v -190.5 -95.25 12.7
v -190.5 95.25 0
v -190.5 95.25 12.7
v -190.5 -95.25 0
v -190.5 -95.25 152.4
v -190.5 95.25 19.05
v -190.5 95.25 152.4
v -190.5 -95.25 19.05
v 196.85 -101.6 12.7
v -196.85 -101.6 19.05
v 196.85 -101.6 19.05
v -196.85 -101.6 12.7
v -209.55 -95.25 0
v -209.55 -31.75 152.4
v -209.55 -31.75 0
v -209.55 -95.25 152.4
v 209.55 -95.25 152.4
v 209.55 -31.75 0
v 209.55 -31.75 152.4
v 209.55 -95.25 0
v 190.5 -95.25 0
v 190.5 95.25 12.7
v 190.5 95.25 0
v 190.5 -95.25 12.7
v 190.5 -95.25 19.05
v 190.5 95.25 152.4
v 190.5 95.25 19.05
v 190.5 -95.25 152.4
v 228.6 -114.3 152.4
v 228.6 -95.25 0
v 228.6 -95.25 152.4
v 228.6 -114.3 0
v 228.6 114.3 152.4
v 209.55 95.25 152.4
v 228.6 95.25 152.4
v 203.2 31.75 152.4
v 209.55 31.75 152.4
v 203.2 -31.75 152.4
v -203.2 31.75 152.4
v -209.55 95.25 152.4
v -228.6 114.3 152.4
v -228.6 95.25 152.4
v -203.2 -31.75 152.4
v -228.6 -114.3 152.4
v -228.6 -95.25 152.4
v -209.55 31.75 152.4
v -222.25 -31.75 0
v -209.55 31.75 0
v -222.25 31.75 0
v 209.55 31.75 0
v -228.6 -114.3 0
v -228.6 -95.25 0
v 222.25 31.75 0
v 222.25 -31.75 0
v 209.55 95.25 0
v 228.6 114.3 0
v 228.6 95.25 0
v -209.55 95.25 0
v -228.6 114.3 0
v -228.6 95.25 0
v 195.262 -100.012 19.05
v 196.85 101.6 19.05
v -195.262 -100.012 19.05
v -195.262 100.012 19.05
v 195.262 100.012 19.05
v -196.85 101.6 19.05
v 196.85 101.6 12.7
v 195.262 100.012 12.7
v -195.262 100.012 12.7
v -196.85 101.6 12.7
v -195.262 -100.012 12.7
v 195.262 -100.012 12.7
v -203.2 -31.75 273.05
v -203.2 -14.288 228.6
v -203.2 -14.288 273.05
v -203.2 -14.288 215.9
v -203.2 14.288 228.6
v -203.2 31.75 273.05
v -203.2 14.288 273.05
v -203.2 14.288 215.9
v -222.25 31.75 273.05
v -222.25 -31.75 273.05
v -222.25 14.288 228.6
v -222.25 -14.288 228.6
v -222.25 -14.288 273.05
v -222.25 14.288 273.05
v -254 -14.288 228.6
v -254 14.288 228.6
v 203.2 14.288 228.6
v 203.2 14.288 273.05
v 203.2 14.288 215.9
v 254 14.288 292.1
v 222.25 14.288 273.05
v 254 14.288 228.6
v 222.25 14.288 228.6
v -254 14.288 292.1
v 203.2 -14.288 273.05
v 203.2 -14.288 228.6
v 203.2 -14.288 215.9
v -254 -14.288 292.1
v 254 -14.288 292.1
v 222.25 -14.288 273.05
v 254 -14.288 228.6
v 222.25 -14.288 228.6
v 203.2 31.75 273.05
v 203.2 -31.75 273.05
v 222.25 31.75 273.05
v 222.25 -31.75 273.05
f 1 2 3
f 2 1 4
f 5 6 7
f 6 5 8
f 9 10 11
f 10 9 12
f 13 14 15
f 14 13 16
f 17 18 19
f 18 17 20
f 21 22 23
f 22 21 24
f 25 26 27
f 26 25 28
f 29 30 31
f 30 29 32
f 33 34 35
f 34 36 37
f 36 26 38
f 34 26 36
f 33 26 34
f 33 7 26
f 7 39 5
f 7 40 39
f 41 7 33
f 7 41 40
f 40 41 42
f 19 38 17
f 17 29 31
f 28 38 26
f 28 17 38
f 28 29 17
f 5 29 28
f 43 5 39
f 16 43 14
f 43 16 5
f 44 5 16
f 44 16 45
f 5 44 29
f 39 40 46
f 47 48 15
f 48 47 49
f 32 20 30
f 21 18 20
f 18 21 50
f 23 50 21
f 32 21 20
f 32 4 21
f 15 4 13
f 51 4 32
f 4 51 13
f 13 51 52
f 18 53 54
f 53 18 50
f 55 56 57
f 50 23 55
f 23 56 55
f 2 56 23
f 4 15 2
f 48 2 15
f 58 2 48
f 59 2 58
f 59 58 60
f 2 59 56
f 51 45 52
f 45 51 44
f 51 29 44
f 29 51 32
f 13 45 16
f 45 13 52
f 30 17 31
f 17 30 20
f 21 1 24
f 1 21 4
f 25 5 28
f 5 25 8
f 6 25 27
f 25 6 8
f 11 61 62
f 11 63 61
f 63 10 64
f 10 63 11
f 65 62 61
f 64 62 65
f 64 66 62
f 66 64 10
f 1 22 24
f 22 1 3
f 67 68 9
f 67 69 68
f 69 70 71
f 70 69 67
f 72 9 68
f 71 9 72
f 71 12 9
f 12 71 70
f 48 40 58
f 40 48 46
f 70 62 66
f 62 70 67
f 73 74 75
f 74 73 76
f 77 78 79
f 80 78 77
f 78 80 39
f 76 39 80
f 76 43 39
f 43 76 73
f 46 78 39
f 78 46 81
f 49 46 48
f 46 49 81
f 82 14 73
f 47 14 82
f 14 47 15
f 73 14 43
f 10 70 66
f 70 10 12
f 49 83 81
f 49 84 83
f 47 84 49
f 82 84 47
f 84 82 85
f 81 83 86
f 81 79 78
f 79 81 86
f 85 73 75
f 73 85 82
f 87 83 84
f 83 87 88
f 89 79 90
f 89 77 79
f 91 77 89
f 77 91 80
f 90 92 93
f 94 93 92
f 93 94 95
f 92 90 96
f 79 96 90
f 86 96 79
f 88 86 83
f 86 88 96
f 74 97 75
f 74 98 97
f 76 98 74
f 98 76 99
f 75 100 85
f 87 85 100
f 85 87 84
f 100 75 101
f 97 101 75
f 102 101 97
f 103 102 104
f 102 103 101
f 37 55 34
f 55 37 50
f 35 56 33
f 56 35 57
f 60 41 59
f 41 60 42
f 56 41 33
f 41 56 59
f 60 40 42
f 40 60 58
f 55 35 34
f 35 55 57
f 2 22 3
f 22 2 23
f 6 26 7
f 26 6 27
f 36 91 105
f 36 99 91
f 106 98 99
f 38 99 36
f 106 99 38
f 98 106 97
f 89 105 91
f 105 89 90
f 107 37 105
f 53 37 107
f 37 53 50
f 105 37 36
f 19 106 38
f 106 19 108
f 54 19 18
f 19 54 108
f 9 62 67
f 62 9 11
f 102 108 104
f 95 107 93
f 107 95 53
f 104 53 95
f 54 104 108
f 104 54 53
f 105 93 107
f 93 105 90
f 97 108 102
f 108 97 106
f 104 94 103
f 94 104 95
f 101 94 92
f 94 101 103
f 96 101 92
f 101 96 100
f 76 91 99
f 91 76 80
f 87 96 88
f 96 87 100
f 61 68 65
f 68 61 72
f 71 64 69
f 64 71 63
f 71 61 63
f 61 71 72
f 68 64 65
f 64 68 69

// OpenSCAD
/*
  TOOL TOTE — parametric solid-wood construction, from IMG_2348.HEIC.
  Dimensions entered in INCHES; generated geometry is in MILLIMETRES.
  X = tote length / grain of sides, handle and bottom.
  Y = tote width. Z = height above the bottom edge of the wooden sides.

  Confirmed: 10.75 is RISER LENGTH, not overall tote height. The handle
  starts as a 3 x 1.125 blank, laminated from two pieces across its width.
  Its underside notches seat 3 above the 6-high sides. The 0.5 notch depth
  and 0.25 riser housing depth are adjustable, user-confirmed defaults.
  Each underside notch continues out through the handle end. Its flat
  ceiling rests on the riser-slot floor, with no second step at the tip.
  The bottom is two edge-glued, bookmatched halves resawn from ONE parent
  board, NOT plywood. Keep stock at least 14 long through jointing/planing
  and 10 long through table-saw operations; finish shorter parts afterward.

  Interpretations left adjustable: end panels sit 0.75 in from side ends,
  enter 0.25-deep side dados, and have square tops; risers start at Z=0.
  Bottom grooves sit 0.5 above the wall bottoms. The side grooves are
  stopped within the end panels, at the roots of the end-panel grooves.
  Screw locations/sizes were not supplied. Optional cheek-cross bores are
  a configurable proposal, disabled by default; no fasteners are modeled.

  OpenSCAD 2021.01-compatible; no external libraries.
  Also see https://github.com/matthova/openrscad and
  https://openrscad.com/playground for the OpenRSCAD engine/playground.
  Open the Customizer, or edit parameters below. Use individual Part views
  for mesh export: touching components may fuse in an assembly STL.
*/

/* [View] */
Part = "assembly"; // [assembly, exploded, side, end, riser, handle, handle_laminate_1, handle_laminate_2, bottom, bottom_half_1, bottom_half_2, joint_detail]
// Separation in the exploded view, inches. Does not change the joinery.
Explode = 1.5; // [0:0.125:4]
Show_cut_list = true;

/* [Body - inches] */
Body_length = 18;
Body_width = 9;
Side_height = 6;
Side_thickness = 0.75;
End_thickness = 0.75;
// Distance from a side's end to the OUTSIDE face of its end panel.
End_setback = 0.75;
// End panels enter transverse dados cut into the side boards.
End_dado_depth = 0.25;

/* [Risers - inches] */
Riser_length = 10.75;
Riser_width = 2.5;
Riser_thickness = 0.75;
// Housing cut into the OUTSIDE face of each end panel.
Riser_dado_depth = 0.25;

/* [Laminated handle - inches] */
Handle_length = 20;
Handle_blank_height = 3;
Handle_width = 1.125;
// Two laminations across handle width; 0.5 means equal 9/16-inch layers.
Handle_lamination_fraction = 0.5; // [0.2:0.05:0.8]
// Distance from side-board TOP to the horizontal seat in each handle notch.
Notch_clearance_above_sides = 3;
// Depth of the continuous underside notch, from each riser's inside edge through the handle end. Its ceiling seats on the riser-slot floor.
Handle_notch_depth = 0.5;

/* [Bookmatched solid bottom - inches] */
Bottom_thickness = 0.25;
Bottom_groove_depth = 0.25;
// Height to the LOWER face of the bottom panel/groove.
Bottom_groove_height = 0.5;
// TOTAL allowance between the two opposing groove roots, not per edge.
Bottom_width_allowance = 0.125;
Bottom_length_allowance = 0.125;
// Total vertical play in a bottom groove, cut above the supported panel.
Bottom_groove_fit = 0;

/* [Joinery fit - inches] */
// Total extra width on dados/notches. Zero gives nominal mating surfaces.
Joint_fit = 0;

/* [Optional screw bores - unconfirmed layout] */
// Proposed transverse screw axis is Y, through a riser cheek into the handle.
Cheek_screw_bores = false;
Screw_bore_diameter = 0.15625;
// Fraction of the engaged bridle height above the notch seat.
Screw_height_fraction = 0.5; // [0.2:0.1:0.8]

/* [Hidden] */
// One color per physical piece; IDs match the viewer legend.
side_a_color = [44/255, 120/255, 181/255];
side_b_color = [57/255, 152/255, 165/255];
end_a_color = [184/255, 121/255, 36/255];
end_b_color = [182/255, 72/255, 59/255];
riser_a_color = [119/255, 98/255, 175/255];
riser_b_color = [180/255, 84/255, 139/255];
handle_a_color = [214/255, 108/255, 50/255];
handle_b_color = [86/255, 125/255, 50/255];
bottom_a_color = [122/255, 134/255, 154/255];
bottom_b_color = [188/255, 169/255, 73/255];

// Stock-preparation defaults for the console cut list and web worksheet.
// These affect stock planning only, not the finished model. Web worksheet
// controls can override them without changing the finished SCAD dimensions.
stock_milling_min_length = 14;
stock_saw_min_length = 10;
stock_resaw_kerf = 1/16;
stock_resaw_cleanup_per_half = 1/16;

inch = 25.4;
eps = 0.001;
$fn = 40;

inner_w = Body_width - 2 * Side_thickness;
end_w = inner_w + 2 * End_dado_depth;
end_outer_x = Body_length / 2 - End_setback;
end_inner_x = end_outer_x - End_thickness;
inner_l = 2 * end_inner_x;
// Canonical end/riser geometry is the +X end; mirror for the other end.
riser_inner_x = end_outer_x - Riser_dado_depth;
riser_center_x = riser_inner_x + Riser_thickness / 2;
riser_outer_x = riser_inner_x + Riser_thickness;
notch_seat_z = Side_height + Notch_clearance_above_sides;
handle_bottom_z = notch_seat_z - Handle_notch_depth;
handle_top_z = handle_bottom_z + Handle_blank_height;
bridle_engagement = Riser_length - notch_seat_z;
bottom_w = inner_w + 2 * Bottom_groove_depth - Bottom_width_allowance;
bottom_l = inner_l + 2 * Bottom_groove_depth - Bottom_length_allowance;
side_groove_half_length = end_inner_x + Bottom_groove_depth;
lamination_y = -Handle_width / 2 + Handle_width * Handle_lamination_fraction;
screw_z = notch_seat_z + bridle_engagement * Screw_height_fraction;

assert(Body_length > 0 && Body_width > 0 && Side_height > 0,
       "Body dimensions must be positive.");
assert(Side_thickness > 0 && End_thickness > 0 && inner_l > 0 && inner_w > 0,
       "Wall thicknesses/end placement leave no usable interior.");
assert(End_setback >= 0 && End_dado_depth > 0 && End_dado_depth < Side_thickness,
       "End dados must leave wood behind them.");
assert(End_setback == 0 || End_setback > Joint_fit / 2,
       "End dado fit breaks through the side end; increase End_setback.");
assert(Riser_length > Side_height && Riser_width > Handle_width + Joint_fit &&
       Riser_width + Joint_fit < inner_w && Riser_thickness > 0,
       "Risers must fit the end panels and leave two bridle cheeks.");
assert(Riser_dado_depth > 0 && Riser_dado_depth < End_thickness &&
       Riser_dado_depth < Riser_thickness,
       "Riser housing must be shallower than both mating boards.");
assert(Bottom_groove_depth > 0 && Bottom_groove_depth < Side_thickness &&
       Bottom_groove_depth + Riser_dado_depth < End_thickness,
       "Leave a web between the end's bottom groove and riser housing.");
assert(Bottom_thickness > 0 && Bottom_groove_height > 0 &&
       Bottom_groove_height + Bottom_thickness + Bottom_groove_fit < Side_height,
       "Bottom groove must fit within the side height.");
assert(Bottom_width_allowance >= 0 && Bottom_length_allowance >= 0 &&
       Bottom_width_allowance < 2 * Bottom_groove_depth &&
       Bottom_length_allowance < 2 * Bottom_groove_depth && bottom_w > 0 && bottom_l > 0,
       "Bottom panel must engage all four grooves.");
assert(Joint_fit >= 0 && Bottom_groove_fit >= 0, "Fits cannot be negative.");
assert(Handle_notch_depth > 0 && Handle_notch_depth < Handle_blank_height &&
       handle_bottom_z > Side_height && bridle_engagement > 0 &&
       handle_top_z >= Riser_length,
       "Handle must clear sides, engage riser slots and cover riser tops.");
assert(Handle_length / 2 > riser_outer_x + Joint_fit / 2,
       "Handle ends must extend beyond both risers.");
assert(Handle_lamination_fraction > 0 && Handle_lamination_fraction < 1,
       "Both handle laminations must have positive thickness.");
assert(!Cheek_screw_bores ||
       (Screw_bore_diameter > 0 && Screw_bore_diameter < Riser_thickness &&
        screw_z - Screw_bore_diameter / 2 > notch_seat_z &&
        screw_z + Screw_bore_diameter / 2 < Riser_length),
       "Screw bore must lie inside the engaged bridle, clear of edges.");

// Coordinates and cutters below are INCHES, scaled once at the output.
module box_at(p, s) { translate(p) cube(s); }
module at_end(sign) {
    if (sign == 1) children();
    else mirror([1, 0, 0]) children();
}

module side_board() {
    // Canonical side is at +Y; its inside face is y=inner_w/2.
    difference() {
        box_at([-Body_length/2, inner_w/2, 0],
               [Body_length, Side_thickness, Side_height]);
        // Full-height transverse housings for both end panels.
        for (s = [-1, 1]) at_end(s)
            box_at([end_inner_x - Joint_fit/2, inner_w/2 - eps, -eps],
                   [End_thickness + Joint_fit, End_dado_depth + eps, Side_height + 2*eps]);
        // Stopped bottom groove: extend into the end-panel joinery only.
        // Follow the end groove roots as body/end dimensions change.
        box_at([-side_groove_half_length, inner_w/2-eps, Bottom_groove_height],
               [2*side_groove_half_length, Bottom_groove_depth+eps,
                Bottom_thickness+Bottom_groove_fit]);
    }
}

module end_board() {
    difference() {
        box_at([end_inner_x, -end_w/2, 0], [End_thickness, end_w, Side_height]);
        // Vertical riser housing, outside face.
        box_at([riser_inner_x, -(Riser_width+Joint_fit)/2, -eps],
               [Riser_dado_depth+eps, Riser_width+Joint_fit, Side_height+2*eps]);
        // Horizontal bottom groove, inside face.
        box_at([end_inner_x-eps, -end_w/2-eps, Bottom_groove_height],
               [Bottom_groove_depth+eps, end_w+2*eps,
                Bottom_thickness+Bottom_groove_fit]);
    }
}

module cheek_bore() {
    translate([riser_center_x, 0, screw_z]) rotate([90, 0, 0])
        cylinder(h=Riser_width+2*eps, d=Screw_bore_diameter, center=true);
}

module riser_board() {
    difference() {
        box_at([riser_inner_x, -Riser_width/2, 0],
               [Riser_thickness, Riser_width, Riser_length]);
        // Open bridle slot down from the riser top to the notch seat.
        box_at([riser_inner_x-eps, -(Handle_width+Joint_fit)/2, notch_seat_z],
               [Riser_thickness+2*eps, Handle_width+Joint_fit, bridle_engagement+eps]);
        if (Cheek_screw_bores) cheek_bore();
    }
}

module handle_piece(y0, width) {
    difference() {
        box_at([-Handle_length/2, y0, handle_bottom_z],
               [Handle_length, width, Handle_blank_height]);
        // One continuous underside shoulder rests on each riser-slot floor
        // and extends through the handle end. Both laminations share it.
        for (s = [-1, 1]) at_end(s) {
            box_at([riser_inner_x-Joint_fit/2, -Handle_width/2-eps, handle_bottom_z-eps],
                   [Handle_length/2-riser_inner_x+Joint_fit/2+eps,
                    Handle_width+2*eps, Handle_notch_depth+eps]);
            if (Cheek_screw_bores) cheek_bore();
        }
    }
}

module handle_board() { handle_piece(-Handle_width/2, Handle_width); }

module handle_laminate(index) {
    y0 = index == 0 ? -Handle_width/2 : lamination_y;
    w = Handle_width * (index == 0 ? Handle_lamination_fraction : 1-Handle_lamination_fraction);
    handle_piece(y0, w);
}

module bottom_half(index) {
    // Edge-glued mirror mates, grain runs X; seam along y=0.
    box_at([-bottom_l/2, index == 0 ? -bottom_w/2 : 0, Bottom_groove_height],
           [bottom_l, bottom_w/2, Bottom_thickness]);
}

module assembly(e=0) {
    for (s = [-1, 1]) {
        color(s == -1 ? side_a_color : side_b_color) translate([0, s*e, 0])
            if (s == 1) side_board(); else mirror([0, 1, 0]) side_board();
        color(s == -1 ? end_a_color : end_b_color) translate([s*e, 0, 0]) at_end(s) end_board();
        color(s == -1 ? riser_a_color : riser_b_color) translate([s*2*e, 0, e/2]) at_end(s) riser_board();
    }
    for (i = [0, 1]) {
        color(i == 0 ? handle_a_color : handle_b_color)
            translate([0, (i == 0 ? -1 : 1)*e/5, 2*e]) handle_laminate(i);
        color(i == 0 ? bottom_a_color : bottom_b_color)
            translate([0, (i == 0 ? -1 : 1)*e/4, -e]) bottom_half(i);
    }
}

module selected_part() {
    if (Part == "assembly") assembly();
    else if (Part == "exploded") assembly(Explode);
    else if (Part == "side") color(side_b_color) translate([Body_length/2, -inner_w/2, 0]) side_board();
    else if (Part == "end") color(end_b_color) translate([-end_inner_x, end_w/2, 0]) end_board();
    else if (Part == "riser") color(riser_b_color) translate([-riser_inner_x, Riser_width/2, 0]) riser_board();
    else if (Part == "handle") translate([Handle_length/2, Handle_width/2, -handle_bottom_z]) for(i=[0,1]) color(i == 0 ? handle_a_color : handle_b_color) handle_laminate(i);
    else if (Part == "handle_laminate_1") color(handle_a_color)
        translate([Handle_length/2, Handle_width/2, -handle_bottom_z]) handle_laminate(0);
    else if (Part == "handle_laminate_2") color(handle_b_color)
        translate([Handle_length/2, -lamination_y, -handle_bottom_z]) handle_laminate(1);
    else if (Part == "bottom")
        translate([bottom_l/2, bottom_w/2, -Bottom_groove_height])
            for(i=[0,1]) color(i == 0 ? bottom_a_color : bottom_b_color) bottom_half(i);
    else if (Part == "bottom_half_1" || Part == "bottom_half_2")
        color(Part == "bottom_half_1" ? bottom_a_color : bottom_b_color) cube([bottom_l, bottom_w/2, Bottom_thickness]);
    else if (Part == "joint_detail") intersection() {
        assembly();
        box_at([riser_inner_x-1, -Riser_width/2-0.5, Side_height+0.25],
               [Riser_thickness+2.5, Riser_width+1, handle_top_z-Side_height+0.5]);
    }
    else assert(false, str("Unknown Part: ", Part));
}

if (Show_cut_list) {
    echo("CUTLIST_STOCK_V1", [stock_milling_min_length, stock_saw_min_length,
                             stock_resaw_kerf, stock_resaw_cleanup_per_half]);
    // Structured worksheet: id, name, material, quantity, thickness, width, length, blank kind, optional resaw-parent group.
    // Finished rectangular blanks, before joinery; all dimensions in inches.
    echo("CUTLIST_V1", [
        ["side-a", "Side A", "Solid hardwood", 1, Side_thickness, Side_height, Body_length, "Side"],
        ["side-b", "Side B", "Solid hardwood", 1, Side_thickness, Side_height, Body_length, "Side"],
        ["end-a", "End A", "Solid hardwood", 1, End_thickness, Side_height, end_w, "End"],
        ["end-b", "End B", "Solid hardwood", 1, End_thickness, Side_height, end_w, "End"],
        ["riser-a", "Riser A", "Solid hardwood", 1, Riser_thickness, Riser_width, Riser_length, "Riser"],
        ["riser-b", "Riser B", "Solid hardwood", 1, Riser_thickness, Riser_width, Riser_length, "Riser"],
        ["handle-a", "Handle lamination A", "Solid hardwood", 1, Handle_width*Handle_lamination_fraction, Handle_blank_height, Handle_length, "Handle lamination"],
        ["handle-b", "Handle lamination B", "Solid hardwood", 1, Handle_width*(1-Handle_lamination_fraction), Handle_blank_height, Handle_length, "Handle lamination"],
        ["bottom-a", "Bottom half A", "Bookmatched hardwood", 1, Bottom_thickness, bottom_w/2, bottom_l, "Bottom half", "bottom-parent"],
        ["bottom-b", "Bottom half B", "Bookmatched hardwood", 1, Bottom_thickness, bottom_w/2, bottom_l, "Bottom half", "bottom-parent"]
    ]);
    echo("FINISHED BLANKS: inches; allow additional stock for machining.");
    echo("Sides x2: L, H, T", [Body_length, Side_height, Side_thickness]);
    echo("Ends x2: W, H, T", [end_w, Side_height, End_thickness]);
    echo("Risers x2: L, W, T", [Riser_length, Riser_width, Riser_thickness]);
    echo("Handle lamination A: L, H, T", [Handle_length, Handle_blank_height, Handle_width*Handle_lamination_fraction]);
    echo("Handle lamination B: L, H, T", [Handle_length, Handle_blank_height, Handle_width*(1-Handle_lamination_fraction)]);
    echo("Bookmatched bottom halves x2: L, W, T", [bottom_l, bottom_w/2, Bottom_thickness]);
    echo("Bottom parent x1: minimum milled T, rough W, rough L",
         [2*(Bottom_thickness+stock_resaw_cleanup_per_half)+stock_resaw_kerf,
          bottom_w/2+0.5, max(bottom_l+1, stock_milling_min_length, stock_saw_min_length)]);
    echo("Keep stock at least this long through jointer/planer and table-saw operations",
         [stock_milling_min_length, stock_saw_min_length]);
    echo("Glued bottom panel: L, W, T", [bottom_l, bottom_w, Bottom_thickness]);
    echo("Inside clear length/width", [inner_l, inner_w]);
    echo("Handle notch seat / handle top / riser top", [notch_seat_z, handle_top_z, Riser_length]);
    echo("Riser-slot engagement", bridle_engagement);
    echo("Continuous handle notch depth / remaining tip height",
         [Handle_notch_depth, Handle_blank_height-Handle_notch_depth]);
    echo("Body end setback and riser dado depth", [End_setback, Riser_dado_depth]);
}

scale([inch, inch, inch]) selected_part();
